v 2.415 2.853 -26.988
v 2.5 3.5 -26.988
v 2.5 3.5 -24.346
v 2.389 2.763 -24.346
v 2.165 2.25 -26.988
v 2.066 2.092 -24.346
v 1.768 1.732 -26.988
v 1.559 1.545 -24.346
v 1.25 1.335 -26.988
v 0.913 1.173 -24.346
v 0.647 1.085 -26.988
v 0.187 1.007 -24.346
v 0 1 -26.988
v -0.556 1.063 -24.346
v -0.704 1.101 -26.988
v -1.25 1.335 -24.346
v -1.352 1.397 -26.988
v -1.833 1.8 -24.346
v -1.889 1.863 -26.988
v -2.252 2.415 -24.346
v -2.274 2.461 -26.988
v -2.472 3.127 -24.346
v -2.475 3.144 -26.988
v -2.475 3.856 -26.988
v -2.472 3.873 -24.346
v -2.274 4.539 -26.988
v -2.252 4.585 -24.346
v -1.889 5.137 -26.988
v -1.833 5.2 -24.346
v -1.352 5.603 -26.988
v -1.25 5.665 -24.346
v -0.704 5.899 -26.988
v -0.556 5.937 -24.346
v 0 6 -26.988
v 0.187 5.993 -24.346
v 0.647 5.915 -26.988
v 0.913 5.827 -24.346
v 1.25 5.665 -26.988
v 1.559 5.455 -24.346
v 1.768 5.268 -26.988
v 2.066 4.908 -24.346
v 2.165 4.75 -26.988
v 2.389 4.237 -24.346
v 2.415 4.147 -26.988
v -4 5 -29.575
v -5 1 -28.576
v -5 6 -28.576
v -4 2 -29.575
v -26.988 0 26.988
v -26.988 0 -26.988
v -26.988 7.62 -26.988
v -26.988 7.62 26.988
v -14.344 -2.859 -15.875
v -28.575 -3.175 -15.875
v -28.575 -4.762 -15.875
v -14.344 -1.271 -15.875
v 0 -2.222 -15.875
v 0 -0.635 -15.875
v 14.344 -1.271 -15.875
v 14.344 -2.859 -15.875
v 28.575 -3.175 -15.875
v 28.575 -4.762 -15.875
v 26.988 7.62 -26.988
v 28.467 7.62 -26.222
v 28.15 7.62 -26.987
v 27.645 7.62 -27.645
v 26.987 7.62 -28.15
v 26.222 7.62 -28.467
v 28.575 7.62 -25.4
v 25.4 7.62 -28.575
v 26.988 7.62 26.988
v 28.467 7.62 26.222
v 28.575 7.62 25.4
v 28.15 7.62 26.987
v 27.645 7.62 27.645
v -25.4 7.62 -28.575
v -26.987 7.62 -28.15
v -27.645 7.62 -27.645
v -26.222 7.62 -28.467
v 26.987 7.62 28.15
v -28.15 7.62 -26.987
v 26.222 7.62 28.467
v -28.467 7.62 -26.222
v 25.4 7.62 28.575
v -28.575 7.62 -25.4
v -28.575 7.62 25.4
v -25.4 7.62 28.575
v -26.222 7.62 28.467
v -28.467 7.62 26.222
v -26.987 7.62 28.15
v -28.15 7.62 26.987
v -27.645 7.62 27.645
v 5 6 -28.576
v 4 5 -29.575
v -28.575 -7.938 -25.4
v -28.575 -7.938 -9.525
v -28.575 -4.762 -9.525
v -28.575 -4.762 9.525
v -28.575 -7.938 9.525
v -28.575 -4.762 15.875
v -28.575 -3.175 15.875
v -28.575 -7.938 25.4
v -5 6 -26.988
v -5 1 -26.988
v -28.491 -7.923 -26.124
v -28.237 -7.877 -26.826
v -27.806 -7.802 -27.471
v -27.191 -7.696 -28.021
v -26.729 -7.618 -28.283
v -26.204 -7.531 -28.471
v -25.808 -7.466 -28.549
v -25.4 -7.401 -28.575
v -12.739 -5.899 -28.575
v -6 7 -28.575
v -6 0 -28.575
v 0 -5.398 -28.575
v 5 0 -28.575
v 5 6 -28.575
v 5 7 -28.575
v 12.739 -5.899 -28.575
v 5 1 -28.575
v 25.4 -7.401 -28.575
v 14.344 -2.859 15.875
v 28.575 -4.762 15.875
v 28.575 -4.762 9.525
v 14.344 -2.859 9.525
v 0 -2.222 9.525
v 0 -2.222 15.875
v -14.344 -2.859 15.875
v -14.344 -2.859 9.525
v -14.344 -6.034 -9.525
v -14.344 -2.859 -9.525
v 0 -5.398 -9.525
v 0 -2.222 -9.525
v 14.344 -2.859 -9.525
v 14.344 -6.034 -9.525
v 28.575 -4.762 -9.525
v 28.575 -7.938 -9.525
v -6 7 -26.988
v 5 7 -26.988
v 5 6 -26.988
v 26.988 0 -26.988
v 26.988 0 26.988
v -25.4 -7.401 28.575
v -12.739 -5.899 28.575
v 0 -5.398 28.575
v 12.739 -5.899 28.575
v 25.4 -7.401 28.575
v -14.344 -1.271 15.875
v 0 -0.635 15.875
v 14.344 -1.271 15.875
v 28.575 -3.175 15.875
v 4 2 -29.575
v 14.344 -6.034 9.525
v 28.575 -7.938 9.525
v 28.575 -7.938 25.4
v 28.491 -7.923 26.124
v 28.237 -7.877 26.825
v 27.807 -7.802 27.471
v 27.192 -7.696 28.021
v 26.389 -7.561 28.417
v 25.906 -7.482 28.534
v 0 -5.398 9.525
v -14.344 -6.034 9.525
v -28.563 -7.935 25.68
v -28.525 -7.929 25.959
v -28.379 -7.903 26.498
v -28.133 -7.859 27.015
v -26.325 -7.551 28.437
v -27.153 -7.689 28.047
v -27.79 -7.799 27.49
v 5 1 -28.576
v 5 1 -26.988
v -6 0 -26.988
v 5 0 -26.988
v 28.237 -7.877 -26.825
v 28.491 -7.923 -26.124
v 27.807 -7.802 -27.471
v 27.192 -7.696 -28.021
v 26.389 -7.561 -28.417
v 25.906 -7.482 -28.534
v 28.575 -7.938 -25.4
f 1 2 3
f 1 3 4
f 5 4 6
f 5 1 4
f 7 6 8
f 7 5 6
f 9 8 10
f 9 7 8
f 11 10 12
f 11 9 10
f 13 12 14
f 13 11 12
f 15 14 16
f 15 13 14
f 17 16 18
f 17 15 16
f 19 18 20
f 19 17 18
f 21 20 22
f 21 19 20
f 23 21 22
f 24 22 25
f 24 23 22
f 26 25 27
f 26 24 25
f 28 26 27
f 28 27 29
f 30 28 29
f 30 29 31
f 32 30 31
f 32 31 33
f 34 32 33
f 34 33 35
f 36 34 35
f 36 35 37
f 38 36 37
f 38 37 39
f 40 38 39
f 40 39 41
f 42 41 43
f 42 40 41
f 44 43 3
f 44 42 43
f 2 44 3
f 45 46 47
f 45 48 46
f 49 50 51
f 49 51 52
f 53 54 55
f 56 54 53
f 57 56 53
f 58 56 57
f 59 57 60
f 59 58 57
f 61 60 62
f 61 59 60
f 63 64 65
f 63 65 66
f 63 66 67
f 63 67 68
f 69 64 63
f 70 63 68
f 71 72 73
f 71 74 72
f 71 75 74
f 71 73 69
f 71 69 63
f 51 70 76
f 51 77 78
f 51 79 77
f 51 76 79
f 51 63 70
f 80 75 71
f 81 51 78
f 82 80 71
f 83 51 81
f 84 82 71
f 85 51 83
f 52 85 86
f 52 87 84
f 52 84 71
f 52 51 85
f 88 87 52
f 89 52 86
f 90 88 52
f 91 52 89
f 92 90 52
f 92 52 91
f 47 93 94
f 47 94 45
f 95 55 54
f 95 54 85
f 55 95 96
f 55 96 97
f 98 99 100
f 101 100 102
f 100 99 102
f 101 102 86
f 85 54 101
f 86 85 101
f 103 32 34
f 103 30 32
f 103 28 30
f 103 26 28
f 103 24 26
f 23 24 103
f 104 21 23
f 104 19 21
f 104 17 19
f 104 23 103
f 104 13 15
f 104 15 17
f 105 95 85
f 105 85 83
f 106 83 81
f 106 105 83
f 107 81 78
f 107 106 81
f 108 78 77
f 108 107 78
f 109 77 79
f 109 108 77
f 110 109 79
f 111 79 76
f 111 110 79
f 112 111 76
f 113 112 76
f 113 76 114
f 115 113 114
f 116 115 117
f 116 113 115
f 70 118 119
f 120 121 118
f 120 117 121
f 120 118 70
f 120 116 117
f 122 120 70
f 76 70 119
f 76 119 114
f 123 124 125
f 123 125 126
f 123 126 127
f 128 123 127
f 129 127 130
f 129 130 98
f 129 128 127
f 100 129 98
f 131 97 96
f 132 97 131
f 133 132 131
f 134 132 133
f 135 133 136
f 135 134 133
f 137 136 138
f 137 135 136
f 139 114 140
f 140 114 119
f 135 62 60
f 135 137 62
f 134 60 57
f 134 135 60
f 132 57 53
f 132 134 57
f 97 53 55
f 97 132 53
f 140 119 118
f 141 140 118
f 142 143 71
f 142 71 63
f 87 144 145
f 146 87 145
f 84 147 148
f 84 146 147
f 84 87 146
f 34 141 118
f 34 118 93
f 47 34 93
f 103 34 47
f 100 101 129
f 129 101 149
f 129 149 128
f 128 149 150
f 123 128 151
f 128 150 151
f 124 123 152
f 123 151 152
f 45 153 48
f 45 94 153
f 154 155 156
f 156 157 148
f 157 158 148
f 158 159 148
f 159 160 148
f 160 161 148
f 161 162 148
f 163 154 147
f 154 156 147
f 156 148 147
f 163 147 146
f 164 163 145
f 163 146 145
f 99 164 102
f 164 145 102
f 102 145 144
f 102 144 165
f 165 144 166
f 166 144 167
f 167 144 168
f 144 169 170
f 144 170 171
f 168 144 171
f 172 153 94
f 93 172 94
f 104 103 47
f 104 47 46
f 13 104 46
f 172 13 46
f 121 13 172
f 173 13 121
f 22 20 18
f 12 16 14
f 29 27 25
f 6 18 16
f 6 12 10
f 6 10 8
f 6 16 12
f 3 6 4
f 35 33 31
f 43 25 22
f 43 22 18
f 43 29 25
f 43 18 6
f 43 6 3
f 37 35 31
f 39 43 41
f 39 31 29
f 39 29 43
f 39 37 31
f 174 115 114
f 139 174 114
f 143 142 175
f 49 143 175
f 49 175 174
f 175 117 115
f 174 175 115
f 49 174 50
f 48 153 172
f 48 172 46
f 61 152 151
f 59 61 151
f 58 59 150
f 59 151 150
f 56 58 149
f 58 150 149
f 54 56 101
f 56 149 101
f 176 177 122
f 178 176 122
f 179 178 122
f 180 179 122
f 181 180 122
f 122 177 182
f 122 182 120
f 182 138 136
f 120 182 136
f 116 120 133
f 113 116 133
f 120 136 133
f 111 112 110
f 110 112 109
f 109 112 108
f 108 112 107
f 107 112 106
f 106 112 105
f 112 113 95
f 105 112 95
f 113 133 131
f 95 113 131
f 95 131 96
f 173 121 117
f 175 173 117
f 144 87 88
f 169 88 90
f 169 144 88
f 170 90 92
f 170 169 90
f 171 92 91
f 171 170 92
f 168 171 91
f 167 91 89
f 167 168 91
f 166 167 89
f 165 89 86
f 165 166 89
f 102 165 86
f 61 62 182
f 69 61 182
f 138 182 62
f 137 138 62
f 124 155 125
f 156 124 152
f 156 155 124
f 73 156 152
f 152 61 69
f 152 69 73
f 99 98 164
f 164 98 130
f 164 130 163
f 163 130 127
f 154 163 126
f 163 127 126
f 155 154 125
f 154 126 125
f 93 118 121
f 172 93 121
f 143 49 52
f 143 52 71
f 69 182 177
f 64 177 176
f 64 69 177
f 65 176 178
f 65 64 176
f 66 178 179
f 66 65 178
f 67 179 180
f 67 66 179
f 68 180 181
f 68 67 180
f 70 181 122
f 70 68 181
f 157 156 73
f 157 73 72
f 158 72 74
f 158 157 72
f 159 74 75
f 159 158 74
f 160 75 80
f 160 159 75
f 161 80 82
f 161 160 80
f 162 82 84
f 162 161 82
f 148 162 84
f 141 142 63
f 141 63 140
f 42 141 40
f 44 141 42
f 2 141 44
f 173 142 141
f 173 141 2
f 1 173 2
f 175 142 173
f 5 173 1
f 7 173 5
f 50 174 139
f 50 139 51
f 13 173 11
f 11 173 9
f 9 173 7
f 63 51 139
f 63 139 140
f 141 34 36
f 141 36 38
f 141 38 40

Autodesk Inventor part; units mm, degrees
ref_plane "YZ Plane" through (0, 0, 0) normal (1, 0, 0) x (0, 1, 0)
ref_plane "XZ Plane" through (0, 0, 0) normal (0, 1, 0) x (-1, 0, 0)
ref_plane "XY Plane" through (0, 0, 0) normal (0, 0, 1) x (1, 0, 0)
sketch "Sketch1" plane through (0, 0, 0) normal (0, 1, 0) x (-1, 0, 0)
  circle A0 centre (0, 0) radius 25.4 construction
  line L0 (-28.575, 28.575) -> (28.575, 28.575)
  line L1 (28.575, 28.575) -> (28.575, -28.575)
  line L2 (28.575, -28.575) -> (-28.575, -28.575)
  line L3 (-28.575, -28.575) -> (-28.575, 28.575)
  line L4 (-28.575, 28.575) -> (28.575, -28.575) construction
  line L5 (28.575, 28.575) -> (-28.575, -28.575) construction
  line L6 (26.9875, 26.9875) -> (-26.9875, 26.9875)
  line L7 (-26.9875, 26.9875) -> (-26.9875, -26.9875)
  line L8 (-26.9875, -26.9875) -> (26.9875, -26.9875)
  line L9 (26.9875, -26.9875) -> (26.9875, 26.9875)
  line L10 (26.9875, 26.9875) -> (-26.9875, -26.9875) construction
  line L11 (-26.9875, 26.9875) -> (26.9875, -26.9875) construction
  dimension "d0" = 50.8
  dimension "d1" = 28.575
  dimension "d18" = 53.975
extrude "Extrusion1" add sketch "Sketch1" along normal blind 7.62
extrude "Extrusion2" add sketch "Sketch1" against normal blind 3.175 contours L0 L1 L2 L3 | L9 L8 L7 L6
sketch "Sketch4" plane through (-25.4, -3.175, 28.575) normal (0, 0, 1) x (1, 0, 0)
  line L0 (53.975, 10.795) -> (53.975, 0) projected
  arc A0 (53.975, 0) -> (-3.175, 0) centre (25.4, -159.4644) ccw
  line L1 (-3.175, 0) -> (53.975, 0) construction
  arc A1 (53.975, -1.5875) -> (-3.175, -1.5875) centre (25.4, -161.0519) ccw
  arc A2 (53.975, -4.7625) -> (-3.175, -4.7625) centre (25.4, -164.2269) ccw
  line L2 (-3.175, -4.7625) -> (-3.175, -1.5875)
  line L3 (-3.175, -1.5875) -> (-3.175, 0)
  line L4 (53.975, -1.5875) -> (53.975, 0)
  line L5 (53.975, -4.7625) -> (53.975, -1.5875)
  point P0 (25.4, 2.54)
  dimension "d56" = 3.175
  dimension "d57" = 1.5875
  dimension "d58" = 2.54
extrude "Extrusion11" add sketch "Sketch4" against normal up to surface (57.15 mm away)
extrude "Extrusion12" cut sketch "Sketch4" against normal blind 44.45 contours L4 A1 L3 A0
extrude "Extrusion13" cut sketch "Sketch4" against normal blind 38.1 contours L5 A2 L2 A1
extrude "Extrusion14" add sketch "Sketch4" against normal blind 12.7 contours L4 A1 L3 A0
extrude "Extrusion15" add sketch "Sketch4" against normal blind 19.05 contours L5 A2 L2 A1
fillet "Fillet6" radius 3.175 4 edges at (28.575, -0.1587, 28.575) (28.575, -0.1587, -28.575) (-28.575, -0.1587, 28.575) (-28.575, -0.1587, -28.575)
sketch "Sketch8" plane through (0, -167.4019, -28.575) normal (0, 0, -1) x (-1, 0, 0)
  line L0 (5, 168.4019) -> (-5, 168.4019)
  line L1 (-5, 168.4019) -> (-5, 167.4019)
  line L2 (-5, 167.4019) -> (6, 167.4019)
  line L3 (-26.9875, 167.4019) -> (26.9875, 167.4019) projected
  line L4 (6, 167.4019) -> (6, 174.4019)
  line L5 (6, 174.4019) -> (-5, 174.4019)
  line L6 (-5, 174.4019) -> (-5, 173.4019)
  line L7 (-5, 173.4019) -> (5, 173.4019)
  line L8 (5, 173.4019) -> (5, 168.4019)
  line L9 (-5, 173.4019) -> (-5, 168.4019)
  point P0 (0, 167.4019)
  point P1 (0, 168.4019)
  dimension "d68" = 1
  dimension "d74" = 1
  dimension "d75" = 1
  dimension "d76" = 7
  dimension "d77" = 10
extrude "Extrusion16" cut sketch "Sketch8" against normal up to surface (1.5875 mm away) contours L8 L7 L6 L5 L4 L2 L1 L0
extrude "Extrusion17" add sketch "Sketch8" along normal blind 1 contours L0 L9 L7 L8
chamfer "Chamfer3" distance 1 angle 45 4 edges at (0, 6, -29.575) (-5, 3.5, -29.575) (0, 1, -29.575) (5, 3.5, -29.575)
sketch "Sketch9" plane through (-26.9875, 7.62, -26.9875) normal (0, 0, 1) x (1, 0, 0)
  circle A0 centre (26.9875, -4.12) radius 2.5
  line L0 (21.9875, -6.62) -> (21.9875, -1.62) projected
  point P0 (26.9875, -7.62)
  point P1 (21.9875, -4.12)
  dimension "d83" = 5
extrude "Extrusion18" add sketch "Sketch9" along normal blind 2.6416
properties part number "TrackDisplayBottom"
